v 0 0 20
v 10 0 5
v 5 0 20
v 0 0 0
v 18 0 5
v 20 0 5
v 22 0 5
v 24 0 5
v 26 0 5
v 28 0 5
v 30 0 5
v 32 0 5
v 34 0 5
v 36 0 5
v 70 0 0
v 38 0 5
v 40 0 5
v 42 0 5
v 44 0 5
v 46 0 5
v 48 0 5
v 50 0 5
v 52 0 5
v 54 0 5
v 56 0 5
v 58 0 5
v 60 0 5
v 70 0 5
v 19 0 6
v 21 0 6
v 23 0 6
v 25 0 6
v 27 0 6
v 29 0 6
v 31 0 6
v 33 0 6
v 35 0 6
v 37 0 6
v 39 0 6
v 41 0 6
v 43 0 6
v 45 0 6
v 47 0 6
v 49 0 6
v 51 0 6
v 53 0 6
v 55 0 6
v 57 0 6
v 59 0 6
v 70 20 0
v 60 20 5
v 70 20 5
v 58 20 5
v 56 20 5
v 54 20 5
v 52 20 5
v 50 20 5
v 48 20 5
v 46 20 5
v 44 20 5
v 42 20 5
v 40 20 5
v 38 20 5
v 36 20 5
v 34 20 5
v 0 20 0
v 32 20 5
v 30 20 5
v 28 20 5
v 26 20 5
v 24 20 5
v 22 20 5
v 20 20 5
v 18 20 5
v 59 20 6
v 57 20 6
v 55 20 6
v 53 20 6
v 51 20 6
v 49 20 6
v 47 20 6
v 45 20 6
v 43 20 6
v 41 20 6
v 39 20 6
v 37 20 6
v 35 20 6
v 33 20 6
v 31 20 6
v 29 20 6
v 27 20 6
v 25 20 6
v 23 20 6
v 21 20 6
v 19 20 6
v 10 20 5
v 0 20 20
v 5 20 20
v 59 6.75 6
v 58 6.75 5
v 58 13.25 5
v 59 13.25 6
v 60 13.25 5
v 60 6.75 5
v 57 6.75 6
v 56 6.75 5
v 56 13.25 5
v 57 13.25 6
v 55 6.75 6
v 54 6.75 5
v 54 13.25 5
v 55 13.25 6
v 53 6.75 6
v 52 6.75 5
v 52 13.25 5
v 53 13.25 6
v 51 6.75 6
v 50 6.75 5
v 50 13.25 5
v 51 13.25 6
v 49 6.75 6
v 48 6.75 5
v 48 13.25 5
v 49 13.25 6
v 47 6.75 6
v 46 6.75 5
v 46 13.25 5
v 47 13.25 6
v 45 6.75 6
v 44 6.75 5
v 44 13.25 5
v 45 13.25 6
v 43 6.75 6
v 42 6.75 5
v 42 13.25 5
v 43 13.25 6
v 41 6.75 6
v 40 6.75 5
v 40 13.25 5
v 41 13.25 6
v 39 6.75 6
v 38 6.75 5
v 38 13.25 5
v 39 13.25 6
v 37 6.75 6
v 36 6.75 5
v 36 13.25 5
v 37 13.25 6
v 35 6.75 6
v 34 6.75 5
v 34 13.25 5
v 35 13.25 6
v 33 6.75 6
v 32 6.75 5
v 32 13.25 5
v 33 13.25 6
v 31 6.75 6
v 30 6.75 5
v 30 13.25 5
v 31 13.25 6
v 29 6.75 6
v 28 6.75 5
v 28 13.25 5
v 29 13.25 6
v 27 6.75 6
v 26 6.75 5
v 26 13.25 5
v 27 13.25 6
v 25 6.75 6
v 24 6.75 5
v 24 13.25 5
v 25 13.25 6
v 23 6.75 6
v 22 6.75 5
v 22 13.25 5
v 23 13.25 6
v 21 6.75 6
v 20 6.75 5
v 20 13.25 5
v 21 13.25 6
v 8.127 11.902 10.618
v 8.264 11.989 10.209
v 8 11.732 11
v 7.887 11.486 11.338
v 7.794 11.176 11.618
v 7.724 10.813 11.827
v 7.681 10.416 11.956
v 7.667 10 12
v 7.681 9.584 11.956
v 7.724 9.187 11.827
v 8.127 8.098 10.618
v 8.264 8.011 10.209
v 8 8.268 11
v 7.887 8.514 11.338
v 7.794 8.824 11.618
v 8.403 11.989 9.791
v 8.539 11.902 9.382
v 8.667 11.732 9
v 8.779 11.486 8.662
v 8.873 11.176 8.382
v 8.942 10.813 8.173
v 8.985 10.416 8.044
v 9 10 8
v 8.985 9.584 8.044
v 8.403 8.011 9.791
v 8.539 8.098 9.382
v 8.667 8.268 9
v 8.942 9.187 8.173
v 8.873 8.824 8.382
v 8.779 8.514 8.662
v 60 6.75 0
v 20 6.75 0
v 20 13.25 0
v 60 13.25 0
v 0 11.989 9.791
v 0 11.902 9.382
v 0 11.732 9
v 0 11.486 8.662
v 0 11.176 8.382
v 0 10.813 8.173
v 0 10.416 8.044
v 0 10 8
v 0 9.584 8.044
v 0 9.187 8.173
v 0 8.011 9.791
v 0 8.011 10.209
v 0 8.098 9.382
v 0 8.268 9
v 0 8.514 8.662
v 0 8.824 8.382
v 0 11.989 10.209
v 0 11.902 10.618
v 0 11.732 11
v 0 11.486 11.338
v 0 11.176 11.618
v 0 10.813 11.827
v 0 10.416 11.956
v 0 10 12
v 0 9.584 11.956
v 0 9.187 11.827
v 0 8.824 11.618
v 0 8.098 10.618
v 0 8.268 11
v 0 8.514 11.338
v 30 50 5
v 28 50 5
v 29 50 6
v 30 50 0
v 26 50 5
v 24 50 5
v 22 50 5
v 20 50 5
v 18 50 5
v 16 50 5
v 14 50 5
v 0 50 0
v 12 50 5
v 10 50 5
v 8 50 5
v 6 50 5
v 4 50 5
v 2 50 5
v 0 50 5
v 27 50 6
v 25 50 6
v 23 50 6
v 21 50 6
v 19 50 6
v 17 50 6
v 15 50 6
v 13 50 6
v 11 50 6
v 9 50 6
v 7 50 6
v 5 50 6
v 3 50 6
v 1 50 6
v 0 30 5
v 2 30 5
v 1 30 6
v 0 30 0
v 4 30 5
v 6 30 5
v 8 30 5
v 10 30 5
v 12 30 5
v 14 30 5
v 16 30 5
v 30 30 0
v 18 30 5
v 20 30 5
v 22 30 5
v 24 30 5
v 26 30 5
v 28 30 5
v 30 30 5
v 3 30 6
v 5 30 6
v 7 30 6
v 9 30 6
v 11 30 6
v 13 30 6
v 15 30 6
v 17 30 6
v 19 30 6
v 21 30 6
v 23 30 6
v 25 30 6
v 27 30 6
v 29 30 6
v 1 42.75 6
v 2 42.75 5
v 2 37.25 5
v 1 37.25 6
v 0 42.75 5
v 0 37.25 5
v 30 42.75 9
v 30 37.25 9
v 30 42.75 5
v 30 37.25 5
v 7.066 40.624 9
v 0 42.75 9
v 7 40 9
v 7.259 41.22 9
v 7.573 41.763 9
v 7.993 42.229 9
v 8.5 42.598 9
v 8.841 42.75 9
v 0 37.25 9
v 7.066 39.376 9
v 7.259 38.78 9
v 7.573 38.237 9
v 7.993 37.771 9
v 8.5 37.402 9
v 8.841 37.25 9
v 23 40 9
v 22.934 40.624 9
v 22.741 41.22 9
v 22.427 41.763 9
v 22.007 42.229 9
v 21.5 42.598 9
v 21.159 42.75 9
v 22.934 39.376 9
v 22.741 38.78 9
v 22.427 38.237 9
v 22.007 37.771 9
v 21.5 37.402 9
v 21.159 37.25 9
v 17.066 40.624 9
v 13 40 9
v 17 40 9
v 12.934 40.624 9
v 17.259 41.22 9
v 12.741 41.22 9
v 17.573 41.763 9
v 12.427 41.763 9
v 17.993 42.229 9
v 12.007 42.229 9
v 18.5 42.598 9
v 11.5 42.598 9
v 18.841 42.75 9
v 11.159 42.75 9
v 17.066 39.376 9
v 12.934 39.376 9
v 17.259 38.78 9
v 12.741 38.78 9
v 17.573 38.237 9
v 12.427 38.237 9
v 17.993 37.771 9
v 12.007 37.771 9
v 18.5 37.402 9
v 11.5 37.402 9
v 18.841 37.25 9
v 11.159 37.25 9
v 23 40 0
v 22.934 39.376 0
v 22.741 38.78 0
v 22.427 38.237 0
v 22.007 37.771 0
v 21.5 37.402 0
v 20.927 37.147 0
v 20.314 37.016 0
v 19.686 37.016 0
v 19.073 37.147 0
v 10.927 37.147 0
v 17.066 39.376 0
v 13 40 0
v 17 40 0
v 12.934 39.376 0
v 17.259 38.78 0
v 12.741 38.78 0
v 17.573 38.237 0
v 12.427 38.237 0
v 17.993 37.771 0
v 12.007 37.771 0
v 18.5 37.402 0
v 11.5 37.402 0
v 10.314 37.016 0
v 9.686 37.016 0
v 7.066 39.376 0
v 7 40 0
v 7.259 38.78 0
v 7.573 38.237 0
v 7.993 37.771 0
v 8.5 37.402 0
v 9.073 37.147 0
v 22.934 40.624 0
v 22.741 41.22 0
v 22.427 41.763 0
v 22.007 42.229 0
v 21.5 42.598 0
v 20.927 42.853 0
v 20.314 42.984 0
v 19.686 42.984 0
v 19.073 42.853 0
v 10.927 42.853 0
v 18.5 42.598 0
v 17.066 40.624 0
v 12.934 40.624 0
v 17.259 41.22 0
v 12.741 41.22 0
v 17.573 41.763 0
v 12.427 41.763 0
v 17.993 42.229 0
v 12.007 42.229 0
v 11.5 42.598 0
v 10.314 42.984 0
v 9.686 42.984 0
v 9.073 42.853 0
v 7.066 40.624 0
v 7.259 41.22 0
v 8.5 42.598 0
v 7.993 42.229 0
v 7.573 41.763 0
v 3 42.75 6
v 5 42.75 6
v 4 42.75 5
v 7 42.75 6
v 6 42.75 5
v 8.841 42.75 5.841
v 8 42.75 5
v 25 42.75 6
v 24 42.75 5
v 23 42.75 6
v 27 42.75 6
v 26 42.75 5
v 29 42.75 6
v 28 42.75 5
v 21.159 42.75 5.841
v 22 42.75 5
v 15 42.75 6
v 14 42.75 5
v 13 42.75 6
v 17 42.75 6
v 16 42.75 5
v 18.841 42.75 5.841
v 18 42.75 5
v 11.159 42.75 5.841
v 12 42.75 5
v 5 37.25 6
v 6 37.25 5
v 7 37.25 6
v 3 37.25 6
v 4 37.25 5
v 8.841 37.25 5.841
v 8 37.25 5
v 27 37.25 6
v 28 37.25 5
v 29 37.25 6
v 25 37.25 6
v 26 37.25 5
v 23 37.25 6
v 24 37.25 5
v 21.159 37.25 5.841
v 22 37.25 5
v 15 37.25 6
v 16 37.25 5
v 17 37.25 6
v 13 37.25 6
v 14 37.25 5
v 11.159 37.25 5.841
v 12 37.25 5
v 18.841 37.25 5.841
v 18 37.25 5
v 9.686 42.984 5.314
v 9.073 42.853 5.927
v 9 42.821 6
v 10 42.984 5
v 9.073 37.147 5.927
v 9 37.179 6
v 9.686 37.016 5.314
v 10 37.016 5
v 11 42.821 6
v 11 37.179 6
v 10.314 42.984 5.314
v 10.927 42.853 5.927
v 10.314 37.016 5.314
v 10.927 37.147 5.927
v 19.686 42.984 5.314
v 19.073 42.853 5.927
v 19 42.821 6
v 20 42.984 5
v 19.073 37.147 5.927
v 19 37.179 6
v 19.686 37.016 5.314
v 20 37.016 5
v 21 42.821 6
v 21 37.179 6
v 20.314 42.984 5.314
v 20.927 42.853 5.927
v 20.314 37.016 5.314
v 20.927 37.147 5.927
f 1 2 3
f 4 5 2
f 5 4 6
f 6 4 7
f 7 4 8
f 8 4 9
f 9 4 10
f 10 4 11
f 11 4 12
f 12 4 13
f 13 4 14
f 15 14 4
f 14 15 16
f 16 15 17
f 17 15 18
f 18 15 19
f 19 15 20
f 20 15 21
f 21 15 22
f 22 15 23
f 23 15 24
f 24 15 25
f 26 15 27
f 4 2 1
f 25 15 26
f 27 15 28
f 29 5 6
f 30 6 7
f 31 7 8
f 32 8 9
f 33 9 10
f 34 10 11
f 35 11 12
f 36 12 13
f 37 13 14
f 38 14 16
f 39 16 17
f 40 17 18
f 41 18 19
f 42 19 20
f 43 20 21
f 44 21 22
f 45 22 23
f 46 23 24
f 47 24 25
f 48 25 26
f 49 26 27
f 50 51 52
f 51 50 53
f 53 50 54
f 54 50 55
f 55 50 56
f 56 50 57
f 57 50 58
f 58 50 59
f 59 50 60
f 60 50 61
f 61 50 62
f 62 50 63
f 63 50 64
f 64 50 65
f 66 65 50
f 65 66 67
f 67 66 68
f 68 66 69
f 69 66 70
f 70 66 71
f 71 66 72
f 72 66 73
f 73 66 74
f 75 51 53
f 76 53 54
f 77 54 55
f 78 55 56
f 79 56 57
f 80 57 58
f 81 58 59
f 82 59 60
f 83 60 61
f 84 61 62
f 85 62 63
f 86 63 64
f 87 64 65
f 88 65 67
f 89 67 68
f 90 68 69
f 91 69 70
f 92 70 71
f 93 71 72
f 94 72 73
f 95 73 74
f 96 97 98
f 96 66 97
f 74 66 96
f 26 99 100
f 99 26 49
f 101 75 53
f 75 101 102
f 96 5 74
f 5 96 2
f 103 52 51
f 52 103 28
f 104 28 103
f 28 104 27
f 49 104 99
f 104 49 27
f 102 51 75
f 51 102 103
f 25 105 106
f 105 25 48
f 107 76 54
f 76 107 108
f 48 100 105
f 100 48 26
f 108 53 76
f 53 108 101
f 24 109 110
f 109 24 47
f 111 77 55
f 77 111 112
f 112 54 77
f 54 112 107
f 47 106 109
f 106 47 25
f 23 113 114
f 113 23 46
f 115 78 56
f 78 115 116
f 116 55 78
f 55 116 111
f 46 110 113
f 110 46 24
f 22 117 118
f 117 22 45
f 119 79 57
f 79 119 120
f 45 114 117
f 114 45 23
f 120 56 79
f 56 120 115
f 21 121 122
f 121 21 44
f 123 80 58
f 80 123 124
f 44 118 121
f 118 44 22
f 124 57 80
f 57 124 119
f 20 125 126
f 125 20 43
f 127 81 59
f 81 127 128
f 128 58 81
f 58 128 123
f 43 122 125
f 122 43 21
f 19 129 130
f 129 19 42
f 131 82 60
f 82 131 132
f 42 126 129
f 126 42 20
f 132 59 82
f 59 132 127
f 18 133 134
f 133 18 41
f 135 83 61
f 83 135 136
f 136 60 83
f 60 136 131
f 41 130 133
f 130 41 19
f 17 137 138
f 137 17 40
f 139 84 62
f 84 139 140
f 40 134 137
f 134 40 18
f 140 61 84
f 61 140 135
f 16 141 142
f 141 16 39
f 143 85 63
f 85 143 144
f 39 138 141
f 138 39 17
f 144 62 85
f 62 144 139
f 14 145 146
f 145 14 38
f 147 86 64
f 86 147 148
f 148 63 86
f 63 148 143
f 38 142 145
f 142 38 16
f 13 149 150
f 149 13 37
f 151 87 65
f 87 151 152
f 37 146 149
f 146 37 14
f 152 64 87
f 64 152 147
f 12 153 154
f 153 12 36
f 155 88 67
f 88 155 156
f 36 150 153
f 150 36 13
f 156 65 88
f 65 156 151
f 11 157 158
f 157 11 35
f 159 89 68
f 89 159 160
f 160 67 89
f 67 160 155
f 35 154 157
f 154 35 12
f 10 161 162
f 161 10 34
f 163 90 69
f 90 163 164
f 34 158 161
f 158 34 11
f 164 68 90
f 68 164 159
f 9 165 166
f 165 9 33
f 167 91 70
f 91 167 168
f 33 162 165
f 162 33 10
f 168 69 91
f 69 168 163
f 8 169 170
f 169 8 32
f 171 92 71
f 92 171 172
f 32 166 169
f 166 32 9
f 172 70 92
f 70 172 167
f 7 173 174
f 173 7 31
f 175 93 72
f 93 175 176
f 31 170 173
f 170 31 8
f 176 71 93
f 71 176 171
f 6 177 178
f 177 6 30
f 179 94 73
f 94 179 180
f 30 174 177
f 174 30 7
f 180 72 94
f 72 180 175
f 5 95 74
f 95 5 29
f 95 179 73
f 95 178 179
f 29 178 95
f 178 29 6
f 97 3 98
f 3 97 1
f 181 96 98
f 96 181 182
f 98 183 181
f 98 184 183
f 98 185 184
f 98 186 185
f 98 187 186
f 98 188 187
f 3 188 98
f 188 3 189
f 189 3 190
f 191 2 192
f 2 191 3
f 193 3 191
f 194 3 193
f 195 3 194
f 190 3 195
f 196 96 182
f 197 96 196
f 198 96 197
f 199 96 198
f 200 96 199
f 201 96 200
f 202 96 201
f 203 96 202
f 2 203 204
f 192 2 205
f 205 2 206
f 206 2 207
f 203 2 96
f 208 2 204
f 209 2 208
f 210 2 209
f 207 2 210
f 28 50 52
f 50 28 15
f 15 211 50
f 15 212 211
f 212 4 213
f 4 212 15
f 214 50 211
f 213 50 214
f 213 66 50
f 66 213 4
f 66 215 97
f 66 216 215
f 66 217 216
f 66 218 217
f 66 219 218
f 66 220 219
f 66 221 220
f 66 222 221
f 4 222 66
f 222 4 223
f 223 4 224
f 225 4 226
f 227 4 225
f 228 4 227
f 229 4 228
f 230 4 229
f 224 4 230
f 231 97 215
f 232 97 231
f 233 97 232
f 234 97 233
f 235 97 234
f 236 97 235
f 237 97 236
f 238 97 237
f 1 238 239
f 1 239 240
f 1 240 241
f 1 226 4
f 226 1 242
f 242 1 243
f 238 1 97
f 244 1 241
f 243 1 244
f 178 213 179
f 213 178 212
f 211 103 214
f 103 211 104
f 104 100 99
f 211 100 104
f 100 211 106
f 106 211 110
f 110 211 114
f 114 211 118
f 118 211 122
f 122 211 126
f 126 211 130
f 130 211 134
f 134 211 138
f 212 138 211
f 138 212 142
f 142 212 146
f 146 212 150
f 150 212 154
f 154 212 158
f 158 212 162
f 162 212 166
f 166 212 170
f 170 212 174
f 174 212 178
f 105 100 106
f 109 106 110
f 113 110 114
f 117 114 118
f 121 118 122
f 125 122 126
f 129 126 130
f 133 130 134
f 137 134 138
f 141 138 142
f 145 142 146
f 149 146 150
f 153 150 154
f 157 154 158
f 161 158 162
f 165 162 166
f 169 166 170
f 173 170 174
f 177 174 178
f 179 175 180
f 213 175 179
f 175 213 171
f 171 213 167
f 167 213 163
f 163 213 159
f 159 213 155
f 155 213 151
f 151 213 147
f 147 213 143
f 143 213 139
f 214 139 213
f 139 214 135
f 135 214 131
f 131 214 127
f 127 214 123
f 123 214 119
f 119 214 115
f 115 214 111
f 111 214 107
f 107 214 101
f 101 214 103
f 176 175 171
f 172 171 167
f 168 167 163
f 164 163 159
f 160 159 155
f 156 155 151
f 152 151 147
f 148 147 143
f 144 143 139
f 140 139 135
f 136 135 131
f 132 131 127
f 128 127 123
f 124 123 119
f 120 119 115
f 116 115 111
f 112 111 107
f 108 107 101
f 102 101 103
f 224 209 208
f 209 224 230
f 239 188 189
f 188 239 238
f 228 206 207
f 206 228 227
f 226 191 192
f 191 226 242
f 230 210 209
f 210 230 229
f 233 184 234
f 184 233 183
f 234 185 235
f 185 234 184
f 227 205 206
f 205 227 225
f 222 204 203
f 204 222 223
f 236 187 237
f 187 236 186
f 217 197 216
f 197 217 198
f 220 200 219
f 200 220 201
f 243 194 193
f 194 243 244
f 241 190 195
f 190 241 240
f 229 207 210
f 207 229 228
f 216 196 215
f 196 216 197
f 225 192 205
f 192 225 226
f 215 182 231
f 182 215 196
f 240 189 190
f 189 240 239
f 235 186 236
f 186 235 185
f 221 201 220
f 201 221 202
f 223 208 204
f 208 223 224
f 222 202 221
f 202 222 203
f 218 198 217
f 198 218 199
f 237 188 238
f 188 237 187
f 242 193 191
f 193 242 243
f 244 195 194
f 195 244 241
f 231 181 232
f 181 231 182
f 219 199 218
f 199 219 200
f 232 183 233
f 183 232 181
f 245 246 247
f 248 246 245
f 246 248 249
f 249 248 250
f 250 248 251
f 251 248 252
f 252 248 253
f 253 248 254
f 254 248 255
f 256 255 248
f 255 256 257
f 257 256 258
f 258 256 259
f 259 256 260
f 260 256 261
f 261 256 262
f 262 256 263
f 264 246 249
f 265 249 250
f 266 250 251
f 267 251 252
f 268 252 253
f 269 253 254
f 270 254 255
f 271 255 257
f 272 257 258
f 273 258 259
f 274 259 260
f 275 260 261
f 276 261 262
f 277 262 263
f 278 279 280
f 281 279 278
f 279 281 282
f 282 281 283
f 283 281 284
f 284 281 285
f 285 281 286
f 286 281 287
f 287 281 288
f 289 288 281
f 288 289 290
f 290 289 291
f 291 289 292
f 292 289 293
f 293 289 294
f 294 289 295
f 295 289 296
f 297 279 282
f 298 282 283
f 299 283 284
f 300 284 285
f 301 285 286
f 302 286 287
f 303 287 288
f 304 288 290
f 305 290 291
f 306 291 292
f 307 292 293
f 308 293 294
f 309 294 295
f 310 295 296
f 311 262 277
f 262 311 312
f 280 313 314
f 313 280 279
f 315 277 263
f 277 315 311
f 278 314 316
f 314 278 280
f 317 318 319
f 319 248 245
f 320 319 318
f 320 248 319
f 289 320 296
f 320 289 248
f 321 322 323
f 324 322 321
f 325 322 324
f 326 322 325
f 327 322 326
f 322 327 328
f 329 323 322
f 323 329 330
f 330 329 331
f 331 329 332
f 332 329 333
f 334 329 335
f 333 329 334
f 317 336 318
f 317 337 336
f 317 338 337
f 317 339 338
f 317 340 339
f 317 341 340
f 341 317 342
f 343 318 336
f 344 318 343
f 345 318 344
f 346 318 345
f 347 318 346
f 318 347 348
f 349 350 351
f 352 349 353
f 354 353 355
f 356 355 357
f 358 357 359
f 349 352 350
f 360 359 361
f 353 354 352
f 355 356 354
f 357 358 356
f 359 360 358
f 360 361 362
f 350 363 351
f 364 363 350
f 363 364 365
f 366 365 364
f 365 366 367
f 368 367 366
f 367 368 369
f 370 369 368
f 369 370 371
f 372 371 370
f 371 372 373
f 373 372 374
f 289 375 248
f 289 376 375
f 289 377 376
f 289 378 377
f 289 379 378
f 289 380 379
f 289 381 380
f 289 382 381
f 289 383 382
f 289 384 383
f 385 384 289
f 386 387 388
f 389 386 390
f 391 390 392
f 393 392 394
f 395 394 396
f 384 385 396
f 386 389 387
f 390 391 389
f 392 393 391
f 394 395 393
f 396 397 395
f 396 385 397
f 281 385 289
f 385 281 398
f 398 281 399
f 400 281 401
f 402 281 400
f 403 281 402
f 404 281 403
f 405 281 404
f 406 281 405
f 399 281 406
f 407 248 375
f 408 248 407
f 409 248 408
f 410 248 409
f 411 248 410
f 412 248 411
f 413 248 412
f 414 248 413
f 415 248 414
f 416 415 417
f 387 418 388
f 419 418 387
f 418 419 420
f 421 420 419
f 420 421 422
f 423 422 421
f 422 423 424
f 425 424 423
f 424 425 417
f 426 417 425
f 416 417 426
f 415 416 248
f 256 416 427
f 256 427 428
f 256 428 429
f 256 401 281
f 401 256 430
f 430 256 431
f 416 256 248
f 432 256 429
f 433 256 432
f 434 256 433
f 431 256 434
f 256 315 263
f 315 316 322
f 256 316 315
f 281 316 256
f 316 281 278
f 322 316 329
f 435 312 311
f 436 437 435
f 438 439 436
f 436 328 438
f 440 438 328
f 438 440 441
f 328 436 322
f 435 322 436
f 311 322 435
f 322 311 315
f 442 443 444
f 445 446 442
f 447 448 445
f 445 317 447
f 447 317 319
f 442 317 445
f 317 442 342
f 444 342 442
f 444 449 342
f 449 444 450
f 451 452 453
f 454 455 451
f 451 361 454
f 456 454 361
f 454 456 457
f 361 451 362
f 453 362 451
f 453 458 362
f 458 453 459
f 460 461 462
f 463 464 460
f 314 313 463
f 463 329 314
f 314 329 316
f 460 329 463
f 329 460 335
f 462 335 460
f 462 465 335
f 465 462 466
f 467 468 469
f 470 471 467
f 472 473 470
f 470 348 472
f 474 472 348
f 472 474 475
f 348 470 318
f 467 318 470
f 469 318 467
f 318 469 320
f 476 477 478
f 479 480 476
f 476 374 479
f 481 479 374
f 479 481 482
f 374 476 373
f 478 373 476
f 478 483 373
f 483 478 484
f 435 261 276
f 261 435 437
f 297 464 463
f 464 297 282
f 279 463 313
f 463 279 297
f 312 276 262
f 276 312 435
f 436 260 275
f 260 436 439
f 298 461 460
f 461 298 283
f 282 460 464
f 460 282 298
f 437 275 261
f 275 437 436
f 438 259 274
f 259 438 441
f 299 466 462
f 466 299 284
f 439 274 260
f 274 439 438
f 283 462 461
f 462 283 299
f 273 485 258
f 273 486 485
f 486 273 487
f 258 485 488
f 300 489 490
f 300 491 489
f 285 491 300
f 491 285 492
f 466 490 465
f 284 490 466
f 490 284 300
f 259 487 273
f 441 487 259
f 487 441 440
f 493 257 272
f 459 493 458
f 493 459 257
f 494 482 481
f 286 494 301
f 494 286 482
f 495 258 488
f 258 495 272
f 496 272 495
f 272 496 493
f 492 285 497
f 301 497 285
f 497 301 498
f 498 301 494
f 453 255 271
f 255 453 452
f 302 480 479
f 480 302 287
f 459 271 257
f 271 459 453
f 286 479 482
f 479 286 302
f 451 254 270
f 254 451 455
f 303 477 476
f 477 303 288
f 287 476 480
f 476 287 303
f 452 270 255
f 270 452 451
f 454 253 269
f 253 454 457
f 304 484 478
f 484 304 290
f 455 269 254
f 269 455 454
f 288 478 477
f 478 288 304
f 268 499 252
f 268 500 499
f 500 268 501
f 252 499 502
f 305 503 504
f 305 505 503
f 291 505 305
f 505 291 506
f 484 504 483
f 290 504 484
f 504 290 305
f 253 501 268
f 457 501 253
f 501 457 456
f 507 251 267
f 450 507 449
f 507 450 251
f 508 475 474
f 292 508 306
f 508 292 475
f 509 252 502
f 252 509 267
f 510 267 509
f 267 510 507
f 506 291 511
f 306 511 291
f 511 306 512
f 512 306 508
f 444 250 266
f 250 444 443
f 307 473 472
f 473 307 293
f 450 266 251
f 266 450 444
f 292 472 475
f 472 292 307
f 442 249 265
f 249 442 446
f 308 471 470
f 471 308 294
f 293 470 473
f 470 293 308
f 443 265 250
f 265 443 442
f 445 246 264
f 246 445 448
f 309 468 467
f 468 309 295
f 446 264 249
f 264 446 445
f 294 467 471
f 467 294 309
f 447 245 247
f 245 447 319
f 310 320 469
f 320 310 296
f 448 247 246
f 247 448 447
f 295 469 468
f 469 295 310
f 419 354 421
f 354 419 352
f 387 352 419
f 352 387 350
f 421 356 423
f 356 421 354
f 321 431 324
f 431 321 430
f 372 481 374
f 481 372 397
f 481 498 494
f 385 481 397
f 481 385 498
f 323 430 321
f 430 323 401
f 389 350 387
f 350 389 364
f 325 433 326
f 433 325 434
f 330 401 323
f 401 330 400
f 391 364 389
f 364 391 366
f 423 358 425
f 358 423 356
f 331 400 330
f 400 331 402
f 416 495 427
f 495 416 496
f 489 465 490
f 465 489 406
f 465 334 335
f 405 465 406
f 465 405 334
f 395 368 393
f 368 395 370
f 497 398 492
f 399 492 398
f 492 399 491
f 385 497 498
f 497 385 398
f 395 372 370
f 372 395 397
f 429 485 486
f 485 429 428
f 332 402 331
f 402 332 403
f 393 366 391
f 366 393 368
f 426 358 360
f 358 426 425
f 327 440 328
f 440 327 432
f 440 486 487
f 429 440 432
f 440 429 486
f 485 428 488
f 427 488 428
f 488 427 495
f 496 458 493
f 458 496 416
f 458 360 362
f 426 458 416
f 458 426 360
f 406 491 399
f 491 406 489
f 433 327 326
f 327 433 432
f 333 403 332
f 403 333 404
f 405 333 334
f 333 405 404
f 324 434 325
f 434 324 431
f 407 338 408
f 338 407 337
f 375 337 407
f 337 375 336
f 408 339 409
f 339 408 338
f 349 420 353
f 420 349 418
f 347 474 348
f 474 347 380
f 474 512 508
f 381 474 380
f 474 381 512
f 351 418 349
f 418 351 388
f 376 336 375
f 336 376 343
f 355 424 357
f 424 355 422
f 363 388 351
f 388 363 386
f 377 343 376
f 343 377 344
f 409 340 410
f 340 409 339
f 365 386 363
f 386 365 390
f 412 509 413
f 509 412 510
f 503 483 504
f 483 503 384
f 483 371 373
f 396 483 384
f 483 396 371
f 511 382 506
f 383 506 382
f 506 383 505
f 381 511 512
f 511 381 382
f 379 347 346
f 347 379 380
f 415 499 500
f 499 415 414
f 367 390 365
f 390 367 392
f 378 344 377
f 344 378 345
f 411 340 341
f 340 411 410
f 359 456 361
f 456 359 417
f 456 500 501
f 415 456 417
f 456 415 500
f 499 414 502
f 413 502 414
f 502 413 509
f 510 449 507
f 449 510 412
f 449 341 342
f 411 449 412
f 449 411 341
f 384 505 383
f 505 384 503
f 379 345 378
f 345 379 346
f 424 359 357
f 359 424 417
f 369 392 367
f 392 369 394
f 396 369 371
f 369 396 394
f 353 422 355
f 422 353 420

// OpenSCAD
$fn=30;
length=70;


height=20;
footL=20;
holeR=2;

lengthCap=30;
widthSlider=6;
holeCapR=3;


//main part
translate([length,0,0])
rotate([0,0,180])
difference(){
    union(){
        //base body
        rotate([90,0,0])
        linear_extrude(height=height)
        polygon(
        points=[[0,0],
            [length,0],
            [length,footL],
            [length-5,footL],
            [length-10,5],
            [0,5]]);
    //ripple
    for( i=[0:(length/2-15)]){
        translate([10+i*2,0,5])
        rotate([90,0,0])
        linear_extrude(height=height)
        polygon(points=[[0,0],[1,1],[2,0]]);
    }}
    //minus cube..
    translate([length/2-5,-height/2,0])
    cube([length-30, widthSlider+0.5, 20],center =true);
    //minus screw hole
    translate([length-10,-height/2,footL/2])
    rotate([0,90,0])
    cylinder(h=20,r=holeR);
    }

//cap


translate([0,height*2+10,0])
difference(){
    union(){
        translate([0,-height,0])
        cube([lengthCap,height,5]);
        for( i=[0:(lengthCap/2-1)]){
        translate([i*2,0,5])
        rotate([90,0,0])
        linear_extrude(height=height)
        polygon(points=[[0,0],[1,1],[2,0]]);
            
        translate([0,-height/2-((widthSlider-0.5)/2),0])
        cube([lengthCap, widthSlider-0.5, 9]);
    }}
    
    //minus cube..
    translate([lengthCap/2-5,-height/2,0])
        cylinder(h=20,r=holeCapR);
    translate([lengthCap/2+5,-height/2,0])
        cylinder(h=20,r=holeCapR);
}
